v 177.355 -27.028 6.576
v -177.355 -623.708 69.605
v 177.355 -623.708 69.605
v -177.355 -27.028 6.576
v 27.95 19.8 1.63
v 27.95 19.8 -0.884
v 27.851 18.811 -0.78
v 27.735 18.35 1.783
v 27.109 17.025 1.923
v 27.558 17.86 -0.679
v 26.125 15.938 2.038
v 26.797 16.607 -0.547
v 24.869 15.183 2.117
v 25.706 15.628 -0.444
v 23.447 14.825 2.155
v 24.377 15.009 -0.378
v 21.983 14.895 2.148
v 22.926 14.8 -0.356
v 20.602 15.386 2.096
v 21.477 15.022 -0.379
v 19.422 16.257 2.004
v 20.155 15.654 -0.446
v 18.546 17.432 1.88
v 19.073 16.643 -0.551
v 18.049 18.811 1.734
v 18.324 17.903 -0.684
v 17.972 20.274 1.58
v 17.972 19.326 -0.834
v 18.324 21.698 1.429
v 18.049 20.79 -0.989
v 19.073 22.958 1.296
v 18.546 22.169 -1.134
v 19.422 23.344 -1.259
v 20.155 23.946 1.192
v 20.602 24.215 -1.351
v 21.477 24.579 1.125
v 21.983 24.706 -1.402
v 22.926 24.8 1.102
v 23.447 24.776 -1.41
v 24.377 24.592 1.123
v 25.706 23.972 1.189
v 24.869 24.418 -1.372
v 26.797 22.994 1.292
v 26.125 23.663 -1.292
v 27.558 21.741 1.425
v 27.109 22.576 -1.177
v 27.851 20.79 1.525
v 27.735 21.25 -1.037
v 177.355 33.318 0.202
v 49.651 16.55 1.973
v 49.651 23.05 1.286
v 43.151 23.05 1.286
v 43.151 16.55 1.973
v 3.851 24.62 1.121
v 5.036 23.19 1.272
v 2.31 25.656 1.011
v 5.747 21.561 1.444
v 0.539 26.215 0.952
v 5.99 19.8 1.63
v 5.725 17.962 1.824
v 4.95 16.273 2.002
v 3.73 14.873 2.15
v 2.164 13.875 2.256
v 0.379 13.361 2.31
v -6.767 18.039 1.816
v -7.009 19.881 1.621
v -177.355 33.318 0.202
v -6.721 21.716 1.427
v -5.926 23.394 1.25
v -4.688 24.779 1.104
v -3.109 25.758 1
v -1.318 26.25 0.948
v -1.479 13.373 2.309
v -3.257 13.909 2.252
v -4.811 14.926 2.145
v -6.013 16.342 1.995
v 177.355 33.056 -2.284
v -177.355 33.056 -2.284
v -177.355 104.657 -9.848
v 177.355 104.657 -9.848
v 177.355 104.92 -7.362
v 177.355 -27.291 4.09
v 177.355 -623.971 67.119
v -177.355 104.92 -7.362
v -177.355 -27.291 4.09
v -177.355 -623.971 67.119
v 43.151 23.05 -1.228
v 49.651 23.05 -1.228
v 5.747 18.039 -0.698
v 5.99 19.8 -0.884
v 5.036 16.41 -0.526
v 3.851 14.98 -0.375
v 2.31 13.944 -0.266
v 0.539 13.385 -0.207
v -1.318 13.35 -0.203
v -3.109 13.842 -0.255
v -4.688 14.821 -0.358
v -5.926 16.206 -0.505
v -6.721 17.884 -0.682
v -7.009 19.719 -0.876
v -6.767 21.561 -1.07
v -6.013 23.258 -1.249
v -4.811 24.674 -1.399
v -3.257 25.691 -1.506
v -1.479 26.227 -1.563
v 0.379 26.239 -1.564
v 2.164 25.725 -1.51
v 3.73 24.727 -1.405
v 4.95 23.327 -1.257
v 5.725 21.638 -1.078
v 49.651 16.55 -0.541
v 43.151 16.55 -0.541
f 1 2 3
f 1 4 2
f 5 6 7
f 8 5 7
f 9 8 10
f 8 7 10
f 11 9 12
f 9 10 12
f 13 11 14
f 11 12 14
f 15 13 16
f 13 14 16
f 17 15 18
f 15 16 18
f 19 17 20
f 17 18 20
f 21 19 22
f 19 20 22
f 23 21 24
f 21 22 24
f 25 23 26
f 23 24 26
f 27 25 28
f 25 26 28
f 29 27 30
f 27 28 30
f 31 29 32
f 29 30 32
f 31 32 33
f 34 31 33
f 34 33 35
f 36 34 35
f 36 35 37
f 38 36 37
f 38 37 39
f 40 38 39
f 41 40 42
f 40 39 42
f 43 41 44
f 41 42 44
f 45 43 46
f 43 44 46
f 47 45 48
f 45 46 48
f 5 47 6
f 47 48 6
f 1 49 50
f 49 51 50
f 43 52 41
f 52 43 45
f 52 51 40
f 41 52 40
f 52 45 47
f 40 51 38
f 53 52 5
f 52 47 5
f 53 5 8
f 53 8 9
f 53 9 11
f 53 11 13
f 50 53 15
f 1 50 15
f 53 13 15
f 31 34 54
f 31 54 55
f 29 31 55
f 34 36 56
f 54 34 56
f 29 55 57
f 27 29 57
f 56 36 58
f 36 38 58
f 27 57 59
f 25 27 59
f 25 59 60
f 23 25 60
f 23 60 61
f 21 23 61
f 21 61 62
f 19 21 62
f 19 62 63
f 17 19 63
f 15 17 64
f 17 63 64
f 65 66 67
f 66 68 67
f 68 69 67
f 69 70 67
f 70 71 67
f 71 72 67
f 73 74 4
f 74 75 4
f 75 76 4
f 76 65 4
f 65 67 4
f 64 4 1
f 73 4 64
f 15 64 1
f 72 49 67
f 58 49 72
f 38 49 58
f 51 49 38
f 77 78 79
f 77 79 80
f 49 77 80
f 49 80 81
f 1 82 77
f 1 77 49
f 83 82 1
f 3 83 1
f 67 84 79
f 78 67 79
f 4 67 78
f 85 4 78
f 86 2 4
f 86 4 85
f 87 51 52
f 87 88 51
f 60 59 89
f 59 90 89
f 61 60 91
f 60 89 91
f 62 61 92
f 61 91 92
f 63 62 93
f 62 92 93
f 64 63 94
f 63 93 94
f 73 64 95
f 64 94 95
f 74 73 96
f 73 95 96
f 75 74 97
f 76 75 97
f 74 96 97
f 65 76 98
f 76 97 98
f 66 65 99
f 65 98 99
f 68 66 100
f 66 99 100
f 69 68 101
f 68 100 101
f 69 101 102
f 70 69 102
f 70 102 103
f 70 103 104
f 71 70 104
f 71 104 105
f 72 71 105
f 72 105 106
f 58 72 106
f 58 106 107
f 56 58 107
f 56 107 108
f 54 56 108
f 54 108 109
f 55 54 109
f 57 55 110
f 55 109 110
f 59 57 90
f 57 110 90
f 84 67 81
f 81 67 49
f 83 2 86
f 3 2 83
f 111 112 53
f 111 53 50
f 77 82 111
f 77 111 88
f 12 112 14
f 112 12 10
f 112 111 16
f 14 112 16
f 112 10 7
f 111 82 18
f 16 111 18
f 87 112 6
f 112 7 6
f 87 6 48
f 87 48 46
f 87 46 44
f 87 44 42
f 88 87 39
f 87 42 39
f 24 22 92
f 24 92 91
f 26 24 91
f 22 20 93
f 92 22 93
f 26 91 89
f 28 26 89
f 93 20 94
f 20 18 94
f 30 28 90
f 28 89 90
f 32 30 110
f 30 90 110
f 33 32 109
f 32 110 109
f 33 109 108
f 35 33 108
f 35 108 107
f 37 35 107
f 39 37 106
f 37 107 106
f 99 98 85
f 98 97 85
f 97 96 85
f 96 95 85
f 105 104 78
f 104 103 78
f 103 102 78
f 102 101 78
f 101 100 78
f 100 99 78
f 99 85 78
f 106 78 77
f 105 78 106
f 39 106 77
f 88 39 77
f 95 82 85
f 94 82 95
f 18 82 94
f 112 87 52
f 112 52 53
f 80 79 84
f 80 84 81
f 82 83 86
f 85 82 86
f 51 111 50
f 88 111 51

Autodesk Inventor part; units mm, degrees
ref_plane "YZ Plane" through (0, 0, 0) normal (1, 0, 0) x (0, 1, 0)
ref_plane "XZ Plane" through (0, 0, 0) normal (0, 1, 0) x (-1, 0, 0)
ref_plane "XY Plane" through (0, 0, 0) normal (0, 0, 1) x (1, 0, 0)
sketch "Sketch2" plane through (0, 0, 0) normal (1, 0, 0) x (0, 1, 0)
  line L0 (9.7757, 0) -> (-10.7, 0) projected
  line L1 (27.1787, -1.709) -> (12.4213, -1.709) projected
  line L2 (10.7, 0) -> (9.7757, 0) projected
  arc A0 (11, -0.3) -> (10.7, 0) centre (10.7, -0.3) ccw projected
  line L3 (11, -15) -> (11, -0.3) projected
  line L4 (-229.8991, 25.4922) -> (33.0555, -2.2844)
  line L5 (72.0462, -3.8892) -> (-254.3637, 30.5904)
  line L6 (33.0555, -2.2844) -> (33.3182, 0.2018)
  line L7 (-27.0281, 6.5763) -> (-27.2907, 4.0901)
  point P0 (0, 0)
  point P1 (33.3182, 0.2018)
  dimension "d5" = 2.5
extrude "Extrusion2" add sketch "Sketch2" along normal mid plane 354.71
ref_plane "Work Plane1" through (-31.6, 28.9, -15.3) normal (0, 0, 1) x (-0.0000001, -1, 0)
sketch "Sketch3" plane through (-100, -27.0281, -15.3) normal (0, 0, 1) x (1, 0, 0)
  circle A0 centre (99.4902, 46.8281) radius 4.4577 projected
  circle A1 centre (122.9497, 46.8285) radius 3.99 projected
  line L0 (144.7507, 45.1805) -> (148.0507, 45.1805) projected
  circle A2 centre (99.4902, 46.8281) radius 6.5
  circle A3 centre (122.9497, 46.8285) radius 5
  circle A4 centre (146.4007, 46.8285) radius 3.5
  line L1 (148.0507, 48.4805) -> (144.7507, 48.4805) projected
  line L2 (144.4007, 48.8305) -> (144.4007, 44.8305) projected
  line L3 (148.0507, 45.1805) -> (148.0507, 48.4805) projected
  line L4 (144.7507, 45.1805) -> (148.0507, 45.1805) projected
  line L5 (148.0507, 48.4805) -> (144.7507, 48.4805) projected
  line L6 (144.7507, 48.4805) -> (144.7507, 45.1805) projected
  line L7 (149.6507, 50.0785) -> (143.1507, 50.0785)
  line L8 (143.1507, 50.0785) -> (143.1507, 43.5785)
  line L9 (143.1507, 43.5785) -> (149.6507, 43.5785)
  line L10 (149.6507, 43.5785) -> (149.6507, 50.0785)
  line L11 (149.6507, 50.0785) -> (143.1507, 43.5785) construction
  line L12 (143.1507, 50.0785) -> (149.6507, 43.5785) construction
  point P0 (146.4007, 45.1805)
  dimension "d13" = 13
  dimension "d14" = 10
  dimension "d15" = 7
  dimension "d20" = 6.5
  dimension "d21" = 6.5
extrude "Extrusion3" cut sketch "Sketch3" along normal through all contours A0 | A1 | L6 L1 L3 L0 | A2 | A3 | L10 A4 L9 L8 L7 | A4 L7 L10 | L10 L9 A4 | A4 L8 L7 | L9 L8 A4
sketch "Sketch4" plane through (-177.355, -27.2907, 4.0901) normal (0, -0.9944671, 0.1050482) x (1, 0, 0)
  line L0 (354.71, 0) -> (0, 0) projected
  line L1 (354.71, 2.5) -> (354.71, 0) projected
  line L2 (0, 2.5) -> (354.71, 2.5) projected
  line L3 (0, 0) -> (0, 2.5) projected
  point P0 (177.355, -1.2007)
extrude "Extrusion4" add sketch "Sketch4" along normal blind 600
sketch "Sketch5" plane through (-177.355, 33.3182, 0.2018) normal (0, 0.9944671, -0.1050482) x (1, 0, 0)
  line L0 (0, 0) -> (354.71, 0) projected
  line L1 (354.71, 2.5) -> (354.71, 0) projected
  line L2 (0, 2.5) -> (354.71, 2.5) projected
  line L3 (0, 0) -> (0, 2.5) projected
  point P0 (177.355, 3.7007)
extrude "Extrusion5" add sketch "Sketch5" along normal blind 72
sketch "Sketch6" plane through (-177.355, -623.7084, 69.6052) normal (0, 0.1050482, 0.9944671) x (1, 0, 0)
  point P0 (177.355, 627.5694)
properties part number "panel"
